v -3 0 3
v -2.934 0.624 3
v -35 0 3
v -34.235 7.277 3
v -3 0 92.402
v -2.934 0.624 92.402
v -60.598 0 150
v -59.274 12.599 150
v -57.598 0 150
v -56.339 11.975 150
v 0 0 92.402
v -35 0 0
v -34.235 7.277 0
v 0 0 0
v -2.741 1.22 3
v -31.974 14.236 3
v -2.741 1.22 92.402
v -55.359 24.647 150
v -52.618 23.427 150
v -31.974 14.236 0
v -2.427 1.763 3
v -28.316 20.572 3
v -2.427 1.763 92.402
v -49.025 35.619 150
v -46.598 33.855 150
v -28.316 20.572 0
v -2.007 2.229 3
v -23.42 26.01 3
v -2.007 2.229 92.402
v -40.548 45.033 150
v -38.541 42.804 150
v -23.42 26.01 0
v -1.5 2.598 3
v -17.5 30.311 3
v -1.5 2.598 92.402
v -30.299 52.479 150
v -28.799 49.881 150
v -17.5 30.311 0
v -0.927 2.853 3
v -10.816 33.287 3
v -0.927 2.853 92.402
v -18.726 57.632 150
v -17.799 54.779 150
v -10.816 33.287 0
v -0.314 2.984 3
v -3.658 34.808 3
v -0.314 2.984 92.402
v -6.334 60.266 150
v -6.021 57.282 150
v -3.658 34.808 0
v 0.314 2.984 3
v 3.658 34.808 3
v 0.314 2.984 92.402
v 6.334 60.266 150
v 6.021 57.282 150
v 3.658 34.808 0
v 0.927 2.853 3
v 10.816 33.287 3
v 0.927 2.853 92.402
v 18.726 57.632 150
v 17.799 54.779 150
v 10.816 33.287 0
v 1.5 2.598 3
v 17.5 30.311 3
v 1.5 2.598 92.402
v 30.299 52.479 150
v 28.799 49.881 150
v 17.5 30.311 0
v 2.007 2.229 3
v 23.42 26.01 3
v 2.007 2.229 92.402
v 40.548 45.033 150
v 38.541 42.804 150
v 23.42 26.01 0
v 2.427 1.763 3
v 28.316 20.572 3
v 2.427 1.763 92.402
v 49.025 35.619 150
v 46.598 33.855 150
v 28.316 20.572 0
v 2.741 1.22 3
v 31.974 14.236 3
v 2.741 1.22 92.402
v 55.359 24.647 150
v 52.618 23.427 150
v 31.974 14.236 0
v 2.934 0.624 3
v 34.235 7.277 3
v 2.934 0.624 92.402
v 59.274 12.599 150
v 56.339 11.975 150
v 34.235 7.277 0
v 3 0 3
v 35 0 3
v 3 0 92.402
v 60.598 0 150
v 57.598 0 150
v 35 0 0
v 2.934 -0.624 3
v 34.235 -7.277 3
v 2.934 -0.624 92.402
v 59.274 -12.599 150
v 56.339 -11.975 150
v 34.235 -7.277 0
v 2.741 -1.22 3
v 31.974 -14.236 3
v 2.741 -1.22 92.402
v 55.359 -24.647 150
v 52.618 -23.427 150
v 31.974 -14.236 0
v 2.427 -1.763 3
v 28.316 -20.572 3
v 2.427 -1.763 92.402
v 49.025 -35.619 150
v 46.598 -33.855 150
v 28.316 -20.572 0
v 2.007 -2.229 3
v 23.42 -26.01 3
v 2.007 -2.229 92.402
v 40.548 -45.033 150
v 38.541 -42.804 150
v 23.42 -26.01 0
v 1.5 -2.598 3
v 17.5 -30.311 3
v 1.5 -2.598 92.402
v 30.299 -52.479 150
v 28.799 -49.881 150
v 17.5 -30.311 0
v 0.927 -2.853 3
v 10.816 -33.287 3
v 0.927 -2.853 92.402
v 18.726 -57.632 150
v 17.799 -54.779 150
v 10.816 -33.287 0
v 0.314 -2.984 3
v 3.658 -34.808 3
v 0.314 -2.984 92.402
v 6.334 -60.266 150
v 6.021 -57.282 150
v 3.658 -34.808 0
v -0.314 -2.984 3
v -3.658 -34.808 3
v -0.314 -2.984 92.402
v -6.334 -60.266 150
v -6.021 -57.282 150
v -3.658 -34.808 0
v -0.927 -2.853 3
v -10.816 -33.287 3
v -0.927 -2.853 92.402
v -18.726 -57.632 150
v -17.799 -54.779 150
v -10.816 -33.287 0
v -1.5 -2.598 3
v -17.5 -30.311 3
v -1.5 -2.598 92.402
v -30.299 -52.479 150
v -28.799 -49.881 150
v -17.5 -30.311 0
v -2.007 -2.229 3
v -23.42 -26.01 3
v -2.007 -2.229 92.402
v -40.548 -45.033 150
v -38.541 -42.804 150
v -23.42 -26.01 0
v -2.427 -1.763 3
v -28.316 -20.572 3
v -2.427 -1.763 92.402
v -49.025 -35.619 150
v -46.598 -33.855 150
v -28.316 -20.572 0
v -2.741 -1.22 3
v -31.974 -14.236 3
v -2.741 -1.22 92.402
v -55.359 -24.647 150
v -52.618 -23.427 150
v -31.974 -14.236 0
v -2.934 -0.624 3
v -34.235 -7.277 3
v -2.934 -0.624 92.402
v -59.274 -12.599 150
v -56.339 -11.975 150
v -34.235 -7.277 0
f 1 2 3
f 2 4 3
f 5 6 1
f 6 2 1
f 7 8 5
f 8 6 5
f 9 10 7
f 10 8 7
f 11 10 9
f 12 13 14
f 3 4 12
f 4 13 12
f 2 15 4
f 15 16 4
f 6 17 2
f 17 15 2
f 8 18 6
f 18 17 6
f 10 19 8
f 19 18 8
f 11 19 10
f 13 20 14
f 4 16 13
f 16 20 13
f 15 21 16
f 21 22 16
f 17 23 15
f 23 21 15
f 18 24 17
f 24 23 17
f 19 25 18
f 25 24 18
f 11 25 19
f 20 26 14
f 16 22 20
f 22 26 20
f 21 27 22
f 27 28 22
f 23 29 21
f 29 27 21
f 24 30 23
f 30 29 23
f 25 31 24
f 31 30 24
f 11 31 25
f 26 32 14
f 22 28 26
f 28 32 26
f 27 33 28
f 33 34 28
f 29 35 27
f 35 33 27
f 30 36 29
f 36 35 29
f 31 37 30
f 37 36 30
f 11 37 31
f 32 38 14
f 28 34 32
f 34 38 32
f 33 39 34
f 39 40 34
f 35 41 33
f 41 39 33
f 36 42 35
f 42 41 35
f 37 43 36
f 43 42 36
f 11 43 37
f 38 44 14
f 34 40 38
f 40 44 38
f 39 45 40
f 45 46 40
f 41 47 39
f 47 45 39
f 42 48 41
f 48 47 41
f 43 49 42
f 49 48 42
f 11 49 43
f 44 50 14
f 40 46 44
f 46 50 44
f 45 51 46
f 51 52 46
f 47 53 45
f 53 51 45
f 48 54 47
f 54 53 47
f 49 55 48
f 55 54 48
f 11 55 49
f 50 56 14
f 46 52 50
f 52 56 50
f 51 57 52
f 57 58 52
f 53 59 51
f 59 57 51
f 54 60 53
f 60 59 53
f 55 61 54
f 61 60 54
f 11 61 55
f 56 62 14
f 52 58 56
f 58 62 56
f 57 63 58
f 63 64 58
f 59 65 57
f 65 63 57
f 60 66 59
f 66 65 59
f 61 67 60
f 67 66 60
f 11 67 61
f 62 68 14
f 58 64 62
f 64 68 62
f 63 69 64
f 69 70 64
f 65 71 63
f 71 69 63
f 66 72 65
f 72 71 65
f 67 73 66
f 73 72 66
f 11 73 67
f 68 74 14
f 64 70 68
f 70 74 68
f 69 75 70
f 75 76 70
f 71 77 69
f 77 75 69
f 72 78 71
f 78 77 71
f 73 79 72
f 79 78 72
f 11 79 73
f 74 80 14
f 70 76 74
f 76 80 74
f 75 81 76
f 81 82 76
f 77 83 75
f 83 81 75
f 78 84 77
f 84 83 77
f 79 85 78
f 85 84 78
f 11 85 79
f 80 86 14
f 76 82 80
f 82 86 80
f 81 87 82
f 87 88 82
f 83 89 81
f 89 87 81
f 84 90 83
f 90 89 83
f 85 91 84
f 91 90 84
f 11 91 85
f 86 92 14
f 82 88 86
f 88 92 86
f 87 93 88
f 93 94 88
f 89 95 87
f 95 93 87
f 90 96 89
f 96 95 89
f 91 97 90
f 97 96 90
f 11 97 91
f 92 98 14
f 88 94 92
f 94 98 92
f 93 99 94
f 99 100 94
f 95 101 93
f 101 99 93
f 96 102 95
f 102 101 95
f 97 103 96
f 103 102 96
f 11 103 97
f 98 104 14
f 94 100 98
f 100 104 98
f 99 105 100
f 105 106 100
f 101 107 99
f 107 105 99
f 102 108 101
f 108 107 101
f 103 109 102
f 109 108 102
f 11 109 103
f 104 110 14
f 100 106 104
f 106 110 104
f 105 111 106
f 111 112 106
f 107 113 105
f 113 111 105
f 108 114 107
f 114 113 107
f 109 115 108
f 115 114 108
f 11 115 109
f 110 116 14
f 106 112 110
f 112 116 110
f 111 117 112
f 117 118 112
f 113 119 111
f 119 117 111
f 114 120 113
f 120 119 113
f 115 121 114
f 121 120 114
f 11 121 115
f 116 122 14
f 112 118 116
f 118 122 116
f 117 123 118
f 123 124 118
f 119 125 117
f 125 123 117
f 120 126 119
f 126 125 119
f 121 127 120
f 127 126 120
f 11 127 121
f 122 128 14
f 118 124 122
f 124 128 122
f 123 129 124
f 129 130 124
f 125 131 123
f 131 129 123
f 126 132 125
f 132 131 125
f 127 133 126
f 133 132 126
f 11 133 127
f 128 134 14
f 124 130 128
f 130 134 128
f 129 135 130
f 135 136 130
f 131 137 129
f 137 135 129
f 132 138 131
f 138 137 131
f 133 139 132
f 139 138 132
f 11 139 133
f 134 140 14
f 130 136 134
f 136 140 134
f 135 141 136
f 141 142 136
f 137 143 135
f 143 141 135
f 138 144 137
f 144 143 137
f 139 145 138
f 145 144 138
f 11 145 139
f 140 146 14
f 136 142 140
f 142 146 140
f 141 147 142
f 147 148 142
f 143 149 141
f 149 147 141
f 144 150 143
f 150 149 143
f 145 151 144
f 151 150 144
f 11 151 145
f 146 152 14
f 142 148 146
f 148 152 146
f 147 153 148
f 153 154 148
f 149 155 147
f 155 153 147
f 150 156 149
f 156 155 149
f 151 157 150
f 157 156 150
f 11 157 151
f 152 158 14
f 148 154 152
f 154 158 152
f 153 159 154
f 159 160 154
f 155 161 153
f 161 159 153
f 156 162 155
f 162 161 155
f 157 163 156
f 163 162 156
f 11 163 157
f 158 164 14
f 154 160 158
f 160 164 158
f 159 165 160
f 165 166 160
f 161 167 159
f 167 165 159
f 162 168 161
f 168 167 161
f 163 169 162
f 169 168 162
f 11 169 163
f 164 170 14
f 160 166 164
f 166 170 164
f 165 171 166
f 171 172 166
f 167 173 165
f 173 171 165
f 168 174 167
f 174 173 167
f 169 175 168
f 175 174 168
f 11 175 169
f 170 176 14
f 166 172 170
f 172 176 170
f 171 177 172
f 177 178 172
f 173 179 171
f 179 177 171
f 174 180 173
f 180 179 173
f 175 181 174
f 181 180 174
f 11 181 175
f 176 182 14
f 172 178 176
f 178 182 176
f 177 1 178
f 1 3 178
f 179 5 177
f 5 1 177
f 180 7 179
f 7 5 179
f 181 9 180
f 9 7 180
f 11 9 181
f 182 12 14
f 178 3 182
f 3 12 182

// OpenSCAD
module glass(baseR, H, th, glassR){
 stemH = H-glassR-th;
 rotate_extrude()
  polygon([
   [0, 0],
   [baseR, 0],
   [baseR, th],
   [th, th],
   [th, stemH],
   [glassR, H],
   [glassR-th, H],
   [0, stemH]]);
}

module glassV(baseR, H, th, volume){
 innerR = ((3*volume)/3.14)^(1/3);
 stemH = H-innerR;
 glassR = innerR+th;
 rotate_extrude()
  polygon([
   [0, 0],
   [baseR, 0],
   [baseR, th],
   [th, th],
   [th, stemH],
   [glassR, H],
   [innerR, H],
   [0, stemH]]);
}

//glass(baseR=35, H=150, th=3, glassR=70);
glassV(baseR=35, H=150, th=3, volume=200000);
